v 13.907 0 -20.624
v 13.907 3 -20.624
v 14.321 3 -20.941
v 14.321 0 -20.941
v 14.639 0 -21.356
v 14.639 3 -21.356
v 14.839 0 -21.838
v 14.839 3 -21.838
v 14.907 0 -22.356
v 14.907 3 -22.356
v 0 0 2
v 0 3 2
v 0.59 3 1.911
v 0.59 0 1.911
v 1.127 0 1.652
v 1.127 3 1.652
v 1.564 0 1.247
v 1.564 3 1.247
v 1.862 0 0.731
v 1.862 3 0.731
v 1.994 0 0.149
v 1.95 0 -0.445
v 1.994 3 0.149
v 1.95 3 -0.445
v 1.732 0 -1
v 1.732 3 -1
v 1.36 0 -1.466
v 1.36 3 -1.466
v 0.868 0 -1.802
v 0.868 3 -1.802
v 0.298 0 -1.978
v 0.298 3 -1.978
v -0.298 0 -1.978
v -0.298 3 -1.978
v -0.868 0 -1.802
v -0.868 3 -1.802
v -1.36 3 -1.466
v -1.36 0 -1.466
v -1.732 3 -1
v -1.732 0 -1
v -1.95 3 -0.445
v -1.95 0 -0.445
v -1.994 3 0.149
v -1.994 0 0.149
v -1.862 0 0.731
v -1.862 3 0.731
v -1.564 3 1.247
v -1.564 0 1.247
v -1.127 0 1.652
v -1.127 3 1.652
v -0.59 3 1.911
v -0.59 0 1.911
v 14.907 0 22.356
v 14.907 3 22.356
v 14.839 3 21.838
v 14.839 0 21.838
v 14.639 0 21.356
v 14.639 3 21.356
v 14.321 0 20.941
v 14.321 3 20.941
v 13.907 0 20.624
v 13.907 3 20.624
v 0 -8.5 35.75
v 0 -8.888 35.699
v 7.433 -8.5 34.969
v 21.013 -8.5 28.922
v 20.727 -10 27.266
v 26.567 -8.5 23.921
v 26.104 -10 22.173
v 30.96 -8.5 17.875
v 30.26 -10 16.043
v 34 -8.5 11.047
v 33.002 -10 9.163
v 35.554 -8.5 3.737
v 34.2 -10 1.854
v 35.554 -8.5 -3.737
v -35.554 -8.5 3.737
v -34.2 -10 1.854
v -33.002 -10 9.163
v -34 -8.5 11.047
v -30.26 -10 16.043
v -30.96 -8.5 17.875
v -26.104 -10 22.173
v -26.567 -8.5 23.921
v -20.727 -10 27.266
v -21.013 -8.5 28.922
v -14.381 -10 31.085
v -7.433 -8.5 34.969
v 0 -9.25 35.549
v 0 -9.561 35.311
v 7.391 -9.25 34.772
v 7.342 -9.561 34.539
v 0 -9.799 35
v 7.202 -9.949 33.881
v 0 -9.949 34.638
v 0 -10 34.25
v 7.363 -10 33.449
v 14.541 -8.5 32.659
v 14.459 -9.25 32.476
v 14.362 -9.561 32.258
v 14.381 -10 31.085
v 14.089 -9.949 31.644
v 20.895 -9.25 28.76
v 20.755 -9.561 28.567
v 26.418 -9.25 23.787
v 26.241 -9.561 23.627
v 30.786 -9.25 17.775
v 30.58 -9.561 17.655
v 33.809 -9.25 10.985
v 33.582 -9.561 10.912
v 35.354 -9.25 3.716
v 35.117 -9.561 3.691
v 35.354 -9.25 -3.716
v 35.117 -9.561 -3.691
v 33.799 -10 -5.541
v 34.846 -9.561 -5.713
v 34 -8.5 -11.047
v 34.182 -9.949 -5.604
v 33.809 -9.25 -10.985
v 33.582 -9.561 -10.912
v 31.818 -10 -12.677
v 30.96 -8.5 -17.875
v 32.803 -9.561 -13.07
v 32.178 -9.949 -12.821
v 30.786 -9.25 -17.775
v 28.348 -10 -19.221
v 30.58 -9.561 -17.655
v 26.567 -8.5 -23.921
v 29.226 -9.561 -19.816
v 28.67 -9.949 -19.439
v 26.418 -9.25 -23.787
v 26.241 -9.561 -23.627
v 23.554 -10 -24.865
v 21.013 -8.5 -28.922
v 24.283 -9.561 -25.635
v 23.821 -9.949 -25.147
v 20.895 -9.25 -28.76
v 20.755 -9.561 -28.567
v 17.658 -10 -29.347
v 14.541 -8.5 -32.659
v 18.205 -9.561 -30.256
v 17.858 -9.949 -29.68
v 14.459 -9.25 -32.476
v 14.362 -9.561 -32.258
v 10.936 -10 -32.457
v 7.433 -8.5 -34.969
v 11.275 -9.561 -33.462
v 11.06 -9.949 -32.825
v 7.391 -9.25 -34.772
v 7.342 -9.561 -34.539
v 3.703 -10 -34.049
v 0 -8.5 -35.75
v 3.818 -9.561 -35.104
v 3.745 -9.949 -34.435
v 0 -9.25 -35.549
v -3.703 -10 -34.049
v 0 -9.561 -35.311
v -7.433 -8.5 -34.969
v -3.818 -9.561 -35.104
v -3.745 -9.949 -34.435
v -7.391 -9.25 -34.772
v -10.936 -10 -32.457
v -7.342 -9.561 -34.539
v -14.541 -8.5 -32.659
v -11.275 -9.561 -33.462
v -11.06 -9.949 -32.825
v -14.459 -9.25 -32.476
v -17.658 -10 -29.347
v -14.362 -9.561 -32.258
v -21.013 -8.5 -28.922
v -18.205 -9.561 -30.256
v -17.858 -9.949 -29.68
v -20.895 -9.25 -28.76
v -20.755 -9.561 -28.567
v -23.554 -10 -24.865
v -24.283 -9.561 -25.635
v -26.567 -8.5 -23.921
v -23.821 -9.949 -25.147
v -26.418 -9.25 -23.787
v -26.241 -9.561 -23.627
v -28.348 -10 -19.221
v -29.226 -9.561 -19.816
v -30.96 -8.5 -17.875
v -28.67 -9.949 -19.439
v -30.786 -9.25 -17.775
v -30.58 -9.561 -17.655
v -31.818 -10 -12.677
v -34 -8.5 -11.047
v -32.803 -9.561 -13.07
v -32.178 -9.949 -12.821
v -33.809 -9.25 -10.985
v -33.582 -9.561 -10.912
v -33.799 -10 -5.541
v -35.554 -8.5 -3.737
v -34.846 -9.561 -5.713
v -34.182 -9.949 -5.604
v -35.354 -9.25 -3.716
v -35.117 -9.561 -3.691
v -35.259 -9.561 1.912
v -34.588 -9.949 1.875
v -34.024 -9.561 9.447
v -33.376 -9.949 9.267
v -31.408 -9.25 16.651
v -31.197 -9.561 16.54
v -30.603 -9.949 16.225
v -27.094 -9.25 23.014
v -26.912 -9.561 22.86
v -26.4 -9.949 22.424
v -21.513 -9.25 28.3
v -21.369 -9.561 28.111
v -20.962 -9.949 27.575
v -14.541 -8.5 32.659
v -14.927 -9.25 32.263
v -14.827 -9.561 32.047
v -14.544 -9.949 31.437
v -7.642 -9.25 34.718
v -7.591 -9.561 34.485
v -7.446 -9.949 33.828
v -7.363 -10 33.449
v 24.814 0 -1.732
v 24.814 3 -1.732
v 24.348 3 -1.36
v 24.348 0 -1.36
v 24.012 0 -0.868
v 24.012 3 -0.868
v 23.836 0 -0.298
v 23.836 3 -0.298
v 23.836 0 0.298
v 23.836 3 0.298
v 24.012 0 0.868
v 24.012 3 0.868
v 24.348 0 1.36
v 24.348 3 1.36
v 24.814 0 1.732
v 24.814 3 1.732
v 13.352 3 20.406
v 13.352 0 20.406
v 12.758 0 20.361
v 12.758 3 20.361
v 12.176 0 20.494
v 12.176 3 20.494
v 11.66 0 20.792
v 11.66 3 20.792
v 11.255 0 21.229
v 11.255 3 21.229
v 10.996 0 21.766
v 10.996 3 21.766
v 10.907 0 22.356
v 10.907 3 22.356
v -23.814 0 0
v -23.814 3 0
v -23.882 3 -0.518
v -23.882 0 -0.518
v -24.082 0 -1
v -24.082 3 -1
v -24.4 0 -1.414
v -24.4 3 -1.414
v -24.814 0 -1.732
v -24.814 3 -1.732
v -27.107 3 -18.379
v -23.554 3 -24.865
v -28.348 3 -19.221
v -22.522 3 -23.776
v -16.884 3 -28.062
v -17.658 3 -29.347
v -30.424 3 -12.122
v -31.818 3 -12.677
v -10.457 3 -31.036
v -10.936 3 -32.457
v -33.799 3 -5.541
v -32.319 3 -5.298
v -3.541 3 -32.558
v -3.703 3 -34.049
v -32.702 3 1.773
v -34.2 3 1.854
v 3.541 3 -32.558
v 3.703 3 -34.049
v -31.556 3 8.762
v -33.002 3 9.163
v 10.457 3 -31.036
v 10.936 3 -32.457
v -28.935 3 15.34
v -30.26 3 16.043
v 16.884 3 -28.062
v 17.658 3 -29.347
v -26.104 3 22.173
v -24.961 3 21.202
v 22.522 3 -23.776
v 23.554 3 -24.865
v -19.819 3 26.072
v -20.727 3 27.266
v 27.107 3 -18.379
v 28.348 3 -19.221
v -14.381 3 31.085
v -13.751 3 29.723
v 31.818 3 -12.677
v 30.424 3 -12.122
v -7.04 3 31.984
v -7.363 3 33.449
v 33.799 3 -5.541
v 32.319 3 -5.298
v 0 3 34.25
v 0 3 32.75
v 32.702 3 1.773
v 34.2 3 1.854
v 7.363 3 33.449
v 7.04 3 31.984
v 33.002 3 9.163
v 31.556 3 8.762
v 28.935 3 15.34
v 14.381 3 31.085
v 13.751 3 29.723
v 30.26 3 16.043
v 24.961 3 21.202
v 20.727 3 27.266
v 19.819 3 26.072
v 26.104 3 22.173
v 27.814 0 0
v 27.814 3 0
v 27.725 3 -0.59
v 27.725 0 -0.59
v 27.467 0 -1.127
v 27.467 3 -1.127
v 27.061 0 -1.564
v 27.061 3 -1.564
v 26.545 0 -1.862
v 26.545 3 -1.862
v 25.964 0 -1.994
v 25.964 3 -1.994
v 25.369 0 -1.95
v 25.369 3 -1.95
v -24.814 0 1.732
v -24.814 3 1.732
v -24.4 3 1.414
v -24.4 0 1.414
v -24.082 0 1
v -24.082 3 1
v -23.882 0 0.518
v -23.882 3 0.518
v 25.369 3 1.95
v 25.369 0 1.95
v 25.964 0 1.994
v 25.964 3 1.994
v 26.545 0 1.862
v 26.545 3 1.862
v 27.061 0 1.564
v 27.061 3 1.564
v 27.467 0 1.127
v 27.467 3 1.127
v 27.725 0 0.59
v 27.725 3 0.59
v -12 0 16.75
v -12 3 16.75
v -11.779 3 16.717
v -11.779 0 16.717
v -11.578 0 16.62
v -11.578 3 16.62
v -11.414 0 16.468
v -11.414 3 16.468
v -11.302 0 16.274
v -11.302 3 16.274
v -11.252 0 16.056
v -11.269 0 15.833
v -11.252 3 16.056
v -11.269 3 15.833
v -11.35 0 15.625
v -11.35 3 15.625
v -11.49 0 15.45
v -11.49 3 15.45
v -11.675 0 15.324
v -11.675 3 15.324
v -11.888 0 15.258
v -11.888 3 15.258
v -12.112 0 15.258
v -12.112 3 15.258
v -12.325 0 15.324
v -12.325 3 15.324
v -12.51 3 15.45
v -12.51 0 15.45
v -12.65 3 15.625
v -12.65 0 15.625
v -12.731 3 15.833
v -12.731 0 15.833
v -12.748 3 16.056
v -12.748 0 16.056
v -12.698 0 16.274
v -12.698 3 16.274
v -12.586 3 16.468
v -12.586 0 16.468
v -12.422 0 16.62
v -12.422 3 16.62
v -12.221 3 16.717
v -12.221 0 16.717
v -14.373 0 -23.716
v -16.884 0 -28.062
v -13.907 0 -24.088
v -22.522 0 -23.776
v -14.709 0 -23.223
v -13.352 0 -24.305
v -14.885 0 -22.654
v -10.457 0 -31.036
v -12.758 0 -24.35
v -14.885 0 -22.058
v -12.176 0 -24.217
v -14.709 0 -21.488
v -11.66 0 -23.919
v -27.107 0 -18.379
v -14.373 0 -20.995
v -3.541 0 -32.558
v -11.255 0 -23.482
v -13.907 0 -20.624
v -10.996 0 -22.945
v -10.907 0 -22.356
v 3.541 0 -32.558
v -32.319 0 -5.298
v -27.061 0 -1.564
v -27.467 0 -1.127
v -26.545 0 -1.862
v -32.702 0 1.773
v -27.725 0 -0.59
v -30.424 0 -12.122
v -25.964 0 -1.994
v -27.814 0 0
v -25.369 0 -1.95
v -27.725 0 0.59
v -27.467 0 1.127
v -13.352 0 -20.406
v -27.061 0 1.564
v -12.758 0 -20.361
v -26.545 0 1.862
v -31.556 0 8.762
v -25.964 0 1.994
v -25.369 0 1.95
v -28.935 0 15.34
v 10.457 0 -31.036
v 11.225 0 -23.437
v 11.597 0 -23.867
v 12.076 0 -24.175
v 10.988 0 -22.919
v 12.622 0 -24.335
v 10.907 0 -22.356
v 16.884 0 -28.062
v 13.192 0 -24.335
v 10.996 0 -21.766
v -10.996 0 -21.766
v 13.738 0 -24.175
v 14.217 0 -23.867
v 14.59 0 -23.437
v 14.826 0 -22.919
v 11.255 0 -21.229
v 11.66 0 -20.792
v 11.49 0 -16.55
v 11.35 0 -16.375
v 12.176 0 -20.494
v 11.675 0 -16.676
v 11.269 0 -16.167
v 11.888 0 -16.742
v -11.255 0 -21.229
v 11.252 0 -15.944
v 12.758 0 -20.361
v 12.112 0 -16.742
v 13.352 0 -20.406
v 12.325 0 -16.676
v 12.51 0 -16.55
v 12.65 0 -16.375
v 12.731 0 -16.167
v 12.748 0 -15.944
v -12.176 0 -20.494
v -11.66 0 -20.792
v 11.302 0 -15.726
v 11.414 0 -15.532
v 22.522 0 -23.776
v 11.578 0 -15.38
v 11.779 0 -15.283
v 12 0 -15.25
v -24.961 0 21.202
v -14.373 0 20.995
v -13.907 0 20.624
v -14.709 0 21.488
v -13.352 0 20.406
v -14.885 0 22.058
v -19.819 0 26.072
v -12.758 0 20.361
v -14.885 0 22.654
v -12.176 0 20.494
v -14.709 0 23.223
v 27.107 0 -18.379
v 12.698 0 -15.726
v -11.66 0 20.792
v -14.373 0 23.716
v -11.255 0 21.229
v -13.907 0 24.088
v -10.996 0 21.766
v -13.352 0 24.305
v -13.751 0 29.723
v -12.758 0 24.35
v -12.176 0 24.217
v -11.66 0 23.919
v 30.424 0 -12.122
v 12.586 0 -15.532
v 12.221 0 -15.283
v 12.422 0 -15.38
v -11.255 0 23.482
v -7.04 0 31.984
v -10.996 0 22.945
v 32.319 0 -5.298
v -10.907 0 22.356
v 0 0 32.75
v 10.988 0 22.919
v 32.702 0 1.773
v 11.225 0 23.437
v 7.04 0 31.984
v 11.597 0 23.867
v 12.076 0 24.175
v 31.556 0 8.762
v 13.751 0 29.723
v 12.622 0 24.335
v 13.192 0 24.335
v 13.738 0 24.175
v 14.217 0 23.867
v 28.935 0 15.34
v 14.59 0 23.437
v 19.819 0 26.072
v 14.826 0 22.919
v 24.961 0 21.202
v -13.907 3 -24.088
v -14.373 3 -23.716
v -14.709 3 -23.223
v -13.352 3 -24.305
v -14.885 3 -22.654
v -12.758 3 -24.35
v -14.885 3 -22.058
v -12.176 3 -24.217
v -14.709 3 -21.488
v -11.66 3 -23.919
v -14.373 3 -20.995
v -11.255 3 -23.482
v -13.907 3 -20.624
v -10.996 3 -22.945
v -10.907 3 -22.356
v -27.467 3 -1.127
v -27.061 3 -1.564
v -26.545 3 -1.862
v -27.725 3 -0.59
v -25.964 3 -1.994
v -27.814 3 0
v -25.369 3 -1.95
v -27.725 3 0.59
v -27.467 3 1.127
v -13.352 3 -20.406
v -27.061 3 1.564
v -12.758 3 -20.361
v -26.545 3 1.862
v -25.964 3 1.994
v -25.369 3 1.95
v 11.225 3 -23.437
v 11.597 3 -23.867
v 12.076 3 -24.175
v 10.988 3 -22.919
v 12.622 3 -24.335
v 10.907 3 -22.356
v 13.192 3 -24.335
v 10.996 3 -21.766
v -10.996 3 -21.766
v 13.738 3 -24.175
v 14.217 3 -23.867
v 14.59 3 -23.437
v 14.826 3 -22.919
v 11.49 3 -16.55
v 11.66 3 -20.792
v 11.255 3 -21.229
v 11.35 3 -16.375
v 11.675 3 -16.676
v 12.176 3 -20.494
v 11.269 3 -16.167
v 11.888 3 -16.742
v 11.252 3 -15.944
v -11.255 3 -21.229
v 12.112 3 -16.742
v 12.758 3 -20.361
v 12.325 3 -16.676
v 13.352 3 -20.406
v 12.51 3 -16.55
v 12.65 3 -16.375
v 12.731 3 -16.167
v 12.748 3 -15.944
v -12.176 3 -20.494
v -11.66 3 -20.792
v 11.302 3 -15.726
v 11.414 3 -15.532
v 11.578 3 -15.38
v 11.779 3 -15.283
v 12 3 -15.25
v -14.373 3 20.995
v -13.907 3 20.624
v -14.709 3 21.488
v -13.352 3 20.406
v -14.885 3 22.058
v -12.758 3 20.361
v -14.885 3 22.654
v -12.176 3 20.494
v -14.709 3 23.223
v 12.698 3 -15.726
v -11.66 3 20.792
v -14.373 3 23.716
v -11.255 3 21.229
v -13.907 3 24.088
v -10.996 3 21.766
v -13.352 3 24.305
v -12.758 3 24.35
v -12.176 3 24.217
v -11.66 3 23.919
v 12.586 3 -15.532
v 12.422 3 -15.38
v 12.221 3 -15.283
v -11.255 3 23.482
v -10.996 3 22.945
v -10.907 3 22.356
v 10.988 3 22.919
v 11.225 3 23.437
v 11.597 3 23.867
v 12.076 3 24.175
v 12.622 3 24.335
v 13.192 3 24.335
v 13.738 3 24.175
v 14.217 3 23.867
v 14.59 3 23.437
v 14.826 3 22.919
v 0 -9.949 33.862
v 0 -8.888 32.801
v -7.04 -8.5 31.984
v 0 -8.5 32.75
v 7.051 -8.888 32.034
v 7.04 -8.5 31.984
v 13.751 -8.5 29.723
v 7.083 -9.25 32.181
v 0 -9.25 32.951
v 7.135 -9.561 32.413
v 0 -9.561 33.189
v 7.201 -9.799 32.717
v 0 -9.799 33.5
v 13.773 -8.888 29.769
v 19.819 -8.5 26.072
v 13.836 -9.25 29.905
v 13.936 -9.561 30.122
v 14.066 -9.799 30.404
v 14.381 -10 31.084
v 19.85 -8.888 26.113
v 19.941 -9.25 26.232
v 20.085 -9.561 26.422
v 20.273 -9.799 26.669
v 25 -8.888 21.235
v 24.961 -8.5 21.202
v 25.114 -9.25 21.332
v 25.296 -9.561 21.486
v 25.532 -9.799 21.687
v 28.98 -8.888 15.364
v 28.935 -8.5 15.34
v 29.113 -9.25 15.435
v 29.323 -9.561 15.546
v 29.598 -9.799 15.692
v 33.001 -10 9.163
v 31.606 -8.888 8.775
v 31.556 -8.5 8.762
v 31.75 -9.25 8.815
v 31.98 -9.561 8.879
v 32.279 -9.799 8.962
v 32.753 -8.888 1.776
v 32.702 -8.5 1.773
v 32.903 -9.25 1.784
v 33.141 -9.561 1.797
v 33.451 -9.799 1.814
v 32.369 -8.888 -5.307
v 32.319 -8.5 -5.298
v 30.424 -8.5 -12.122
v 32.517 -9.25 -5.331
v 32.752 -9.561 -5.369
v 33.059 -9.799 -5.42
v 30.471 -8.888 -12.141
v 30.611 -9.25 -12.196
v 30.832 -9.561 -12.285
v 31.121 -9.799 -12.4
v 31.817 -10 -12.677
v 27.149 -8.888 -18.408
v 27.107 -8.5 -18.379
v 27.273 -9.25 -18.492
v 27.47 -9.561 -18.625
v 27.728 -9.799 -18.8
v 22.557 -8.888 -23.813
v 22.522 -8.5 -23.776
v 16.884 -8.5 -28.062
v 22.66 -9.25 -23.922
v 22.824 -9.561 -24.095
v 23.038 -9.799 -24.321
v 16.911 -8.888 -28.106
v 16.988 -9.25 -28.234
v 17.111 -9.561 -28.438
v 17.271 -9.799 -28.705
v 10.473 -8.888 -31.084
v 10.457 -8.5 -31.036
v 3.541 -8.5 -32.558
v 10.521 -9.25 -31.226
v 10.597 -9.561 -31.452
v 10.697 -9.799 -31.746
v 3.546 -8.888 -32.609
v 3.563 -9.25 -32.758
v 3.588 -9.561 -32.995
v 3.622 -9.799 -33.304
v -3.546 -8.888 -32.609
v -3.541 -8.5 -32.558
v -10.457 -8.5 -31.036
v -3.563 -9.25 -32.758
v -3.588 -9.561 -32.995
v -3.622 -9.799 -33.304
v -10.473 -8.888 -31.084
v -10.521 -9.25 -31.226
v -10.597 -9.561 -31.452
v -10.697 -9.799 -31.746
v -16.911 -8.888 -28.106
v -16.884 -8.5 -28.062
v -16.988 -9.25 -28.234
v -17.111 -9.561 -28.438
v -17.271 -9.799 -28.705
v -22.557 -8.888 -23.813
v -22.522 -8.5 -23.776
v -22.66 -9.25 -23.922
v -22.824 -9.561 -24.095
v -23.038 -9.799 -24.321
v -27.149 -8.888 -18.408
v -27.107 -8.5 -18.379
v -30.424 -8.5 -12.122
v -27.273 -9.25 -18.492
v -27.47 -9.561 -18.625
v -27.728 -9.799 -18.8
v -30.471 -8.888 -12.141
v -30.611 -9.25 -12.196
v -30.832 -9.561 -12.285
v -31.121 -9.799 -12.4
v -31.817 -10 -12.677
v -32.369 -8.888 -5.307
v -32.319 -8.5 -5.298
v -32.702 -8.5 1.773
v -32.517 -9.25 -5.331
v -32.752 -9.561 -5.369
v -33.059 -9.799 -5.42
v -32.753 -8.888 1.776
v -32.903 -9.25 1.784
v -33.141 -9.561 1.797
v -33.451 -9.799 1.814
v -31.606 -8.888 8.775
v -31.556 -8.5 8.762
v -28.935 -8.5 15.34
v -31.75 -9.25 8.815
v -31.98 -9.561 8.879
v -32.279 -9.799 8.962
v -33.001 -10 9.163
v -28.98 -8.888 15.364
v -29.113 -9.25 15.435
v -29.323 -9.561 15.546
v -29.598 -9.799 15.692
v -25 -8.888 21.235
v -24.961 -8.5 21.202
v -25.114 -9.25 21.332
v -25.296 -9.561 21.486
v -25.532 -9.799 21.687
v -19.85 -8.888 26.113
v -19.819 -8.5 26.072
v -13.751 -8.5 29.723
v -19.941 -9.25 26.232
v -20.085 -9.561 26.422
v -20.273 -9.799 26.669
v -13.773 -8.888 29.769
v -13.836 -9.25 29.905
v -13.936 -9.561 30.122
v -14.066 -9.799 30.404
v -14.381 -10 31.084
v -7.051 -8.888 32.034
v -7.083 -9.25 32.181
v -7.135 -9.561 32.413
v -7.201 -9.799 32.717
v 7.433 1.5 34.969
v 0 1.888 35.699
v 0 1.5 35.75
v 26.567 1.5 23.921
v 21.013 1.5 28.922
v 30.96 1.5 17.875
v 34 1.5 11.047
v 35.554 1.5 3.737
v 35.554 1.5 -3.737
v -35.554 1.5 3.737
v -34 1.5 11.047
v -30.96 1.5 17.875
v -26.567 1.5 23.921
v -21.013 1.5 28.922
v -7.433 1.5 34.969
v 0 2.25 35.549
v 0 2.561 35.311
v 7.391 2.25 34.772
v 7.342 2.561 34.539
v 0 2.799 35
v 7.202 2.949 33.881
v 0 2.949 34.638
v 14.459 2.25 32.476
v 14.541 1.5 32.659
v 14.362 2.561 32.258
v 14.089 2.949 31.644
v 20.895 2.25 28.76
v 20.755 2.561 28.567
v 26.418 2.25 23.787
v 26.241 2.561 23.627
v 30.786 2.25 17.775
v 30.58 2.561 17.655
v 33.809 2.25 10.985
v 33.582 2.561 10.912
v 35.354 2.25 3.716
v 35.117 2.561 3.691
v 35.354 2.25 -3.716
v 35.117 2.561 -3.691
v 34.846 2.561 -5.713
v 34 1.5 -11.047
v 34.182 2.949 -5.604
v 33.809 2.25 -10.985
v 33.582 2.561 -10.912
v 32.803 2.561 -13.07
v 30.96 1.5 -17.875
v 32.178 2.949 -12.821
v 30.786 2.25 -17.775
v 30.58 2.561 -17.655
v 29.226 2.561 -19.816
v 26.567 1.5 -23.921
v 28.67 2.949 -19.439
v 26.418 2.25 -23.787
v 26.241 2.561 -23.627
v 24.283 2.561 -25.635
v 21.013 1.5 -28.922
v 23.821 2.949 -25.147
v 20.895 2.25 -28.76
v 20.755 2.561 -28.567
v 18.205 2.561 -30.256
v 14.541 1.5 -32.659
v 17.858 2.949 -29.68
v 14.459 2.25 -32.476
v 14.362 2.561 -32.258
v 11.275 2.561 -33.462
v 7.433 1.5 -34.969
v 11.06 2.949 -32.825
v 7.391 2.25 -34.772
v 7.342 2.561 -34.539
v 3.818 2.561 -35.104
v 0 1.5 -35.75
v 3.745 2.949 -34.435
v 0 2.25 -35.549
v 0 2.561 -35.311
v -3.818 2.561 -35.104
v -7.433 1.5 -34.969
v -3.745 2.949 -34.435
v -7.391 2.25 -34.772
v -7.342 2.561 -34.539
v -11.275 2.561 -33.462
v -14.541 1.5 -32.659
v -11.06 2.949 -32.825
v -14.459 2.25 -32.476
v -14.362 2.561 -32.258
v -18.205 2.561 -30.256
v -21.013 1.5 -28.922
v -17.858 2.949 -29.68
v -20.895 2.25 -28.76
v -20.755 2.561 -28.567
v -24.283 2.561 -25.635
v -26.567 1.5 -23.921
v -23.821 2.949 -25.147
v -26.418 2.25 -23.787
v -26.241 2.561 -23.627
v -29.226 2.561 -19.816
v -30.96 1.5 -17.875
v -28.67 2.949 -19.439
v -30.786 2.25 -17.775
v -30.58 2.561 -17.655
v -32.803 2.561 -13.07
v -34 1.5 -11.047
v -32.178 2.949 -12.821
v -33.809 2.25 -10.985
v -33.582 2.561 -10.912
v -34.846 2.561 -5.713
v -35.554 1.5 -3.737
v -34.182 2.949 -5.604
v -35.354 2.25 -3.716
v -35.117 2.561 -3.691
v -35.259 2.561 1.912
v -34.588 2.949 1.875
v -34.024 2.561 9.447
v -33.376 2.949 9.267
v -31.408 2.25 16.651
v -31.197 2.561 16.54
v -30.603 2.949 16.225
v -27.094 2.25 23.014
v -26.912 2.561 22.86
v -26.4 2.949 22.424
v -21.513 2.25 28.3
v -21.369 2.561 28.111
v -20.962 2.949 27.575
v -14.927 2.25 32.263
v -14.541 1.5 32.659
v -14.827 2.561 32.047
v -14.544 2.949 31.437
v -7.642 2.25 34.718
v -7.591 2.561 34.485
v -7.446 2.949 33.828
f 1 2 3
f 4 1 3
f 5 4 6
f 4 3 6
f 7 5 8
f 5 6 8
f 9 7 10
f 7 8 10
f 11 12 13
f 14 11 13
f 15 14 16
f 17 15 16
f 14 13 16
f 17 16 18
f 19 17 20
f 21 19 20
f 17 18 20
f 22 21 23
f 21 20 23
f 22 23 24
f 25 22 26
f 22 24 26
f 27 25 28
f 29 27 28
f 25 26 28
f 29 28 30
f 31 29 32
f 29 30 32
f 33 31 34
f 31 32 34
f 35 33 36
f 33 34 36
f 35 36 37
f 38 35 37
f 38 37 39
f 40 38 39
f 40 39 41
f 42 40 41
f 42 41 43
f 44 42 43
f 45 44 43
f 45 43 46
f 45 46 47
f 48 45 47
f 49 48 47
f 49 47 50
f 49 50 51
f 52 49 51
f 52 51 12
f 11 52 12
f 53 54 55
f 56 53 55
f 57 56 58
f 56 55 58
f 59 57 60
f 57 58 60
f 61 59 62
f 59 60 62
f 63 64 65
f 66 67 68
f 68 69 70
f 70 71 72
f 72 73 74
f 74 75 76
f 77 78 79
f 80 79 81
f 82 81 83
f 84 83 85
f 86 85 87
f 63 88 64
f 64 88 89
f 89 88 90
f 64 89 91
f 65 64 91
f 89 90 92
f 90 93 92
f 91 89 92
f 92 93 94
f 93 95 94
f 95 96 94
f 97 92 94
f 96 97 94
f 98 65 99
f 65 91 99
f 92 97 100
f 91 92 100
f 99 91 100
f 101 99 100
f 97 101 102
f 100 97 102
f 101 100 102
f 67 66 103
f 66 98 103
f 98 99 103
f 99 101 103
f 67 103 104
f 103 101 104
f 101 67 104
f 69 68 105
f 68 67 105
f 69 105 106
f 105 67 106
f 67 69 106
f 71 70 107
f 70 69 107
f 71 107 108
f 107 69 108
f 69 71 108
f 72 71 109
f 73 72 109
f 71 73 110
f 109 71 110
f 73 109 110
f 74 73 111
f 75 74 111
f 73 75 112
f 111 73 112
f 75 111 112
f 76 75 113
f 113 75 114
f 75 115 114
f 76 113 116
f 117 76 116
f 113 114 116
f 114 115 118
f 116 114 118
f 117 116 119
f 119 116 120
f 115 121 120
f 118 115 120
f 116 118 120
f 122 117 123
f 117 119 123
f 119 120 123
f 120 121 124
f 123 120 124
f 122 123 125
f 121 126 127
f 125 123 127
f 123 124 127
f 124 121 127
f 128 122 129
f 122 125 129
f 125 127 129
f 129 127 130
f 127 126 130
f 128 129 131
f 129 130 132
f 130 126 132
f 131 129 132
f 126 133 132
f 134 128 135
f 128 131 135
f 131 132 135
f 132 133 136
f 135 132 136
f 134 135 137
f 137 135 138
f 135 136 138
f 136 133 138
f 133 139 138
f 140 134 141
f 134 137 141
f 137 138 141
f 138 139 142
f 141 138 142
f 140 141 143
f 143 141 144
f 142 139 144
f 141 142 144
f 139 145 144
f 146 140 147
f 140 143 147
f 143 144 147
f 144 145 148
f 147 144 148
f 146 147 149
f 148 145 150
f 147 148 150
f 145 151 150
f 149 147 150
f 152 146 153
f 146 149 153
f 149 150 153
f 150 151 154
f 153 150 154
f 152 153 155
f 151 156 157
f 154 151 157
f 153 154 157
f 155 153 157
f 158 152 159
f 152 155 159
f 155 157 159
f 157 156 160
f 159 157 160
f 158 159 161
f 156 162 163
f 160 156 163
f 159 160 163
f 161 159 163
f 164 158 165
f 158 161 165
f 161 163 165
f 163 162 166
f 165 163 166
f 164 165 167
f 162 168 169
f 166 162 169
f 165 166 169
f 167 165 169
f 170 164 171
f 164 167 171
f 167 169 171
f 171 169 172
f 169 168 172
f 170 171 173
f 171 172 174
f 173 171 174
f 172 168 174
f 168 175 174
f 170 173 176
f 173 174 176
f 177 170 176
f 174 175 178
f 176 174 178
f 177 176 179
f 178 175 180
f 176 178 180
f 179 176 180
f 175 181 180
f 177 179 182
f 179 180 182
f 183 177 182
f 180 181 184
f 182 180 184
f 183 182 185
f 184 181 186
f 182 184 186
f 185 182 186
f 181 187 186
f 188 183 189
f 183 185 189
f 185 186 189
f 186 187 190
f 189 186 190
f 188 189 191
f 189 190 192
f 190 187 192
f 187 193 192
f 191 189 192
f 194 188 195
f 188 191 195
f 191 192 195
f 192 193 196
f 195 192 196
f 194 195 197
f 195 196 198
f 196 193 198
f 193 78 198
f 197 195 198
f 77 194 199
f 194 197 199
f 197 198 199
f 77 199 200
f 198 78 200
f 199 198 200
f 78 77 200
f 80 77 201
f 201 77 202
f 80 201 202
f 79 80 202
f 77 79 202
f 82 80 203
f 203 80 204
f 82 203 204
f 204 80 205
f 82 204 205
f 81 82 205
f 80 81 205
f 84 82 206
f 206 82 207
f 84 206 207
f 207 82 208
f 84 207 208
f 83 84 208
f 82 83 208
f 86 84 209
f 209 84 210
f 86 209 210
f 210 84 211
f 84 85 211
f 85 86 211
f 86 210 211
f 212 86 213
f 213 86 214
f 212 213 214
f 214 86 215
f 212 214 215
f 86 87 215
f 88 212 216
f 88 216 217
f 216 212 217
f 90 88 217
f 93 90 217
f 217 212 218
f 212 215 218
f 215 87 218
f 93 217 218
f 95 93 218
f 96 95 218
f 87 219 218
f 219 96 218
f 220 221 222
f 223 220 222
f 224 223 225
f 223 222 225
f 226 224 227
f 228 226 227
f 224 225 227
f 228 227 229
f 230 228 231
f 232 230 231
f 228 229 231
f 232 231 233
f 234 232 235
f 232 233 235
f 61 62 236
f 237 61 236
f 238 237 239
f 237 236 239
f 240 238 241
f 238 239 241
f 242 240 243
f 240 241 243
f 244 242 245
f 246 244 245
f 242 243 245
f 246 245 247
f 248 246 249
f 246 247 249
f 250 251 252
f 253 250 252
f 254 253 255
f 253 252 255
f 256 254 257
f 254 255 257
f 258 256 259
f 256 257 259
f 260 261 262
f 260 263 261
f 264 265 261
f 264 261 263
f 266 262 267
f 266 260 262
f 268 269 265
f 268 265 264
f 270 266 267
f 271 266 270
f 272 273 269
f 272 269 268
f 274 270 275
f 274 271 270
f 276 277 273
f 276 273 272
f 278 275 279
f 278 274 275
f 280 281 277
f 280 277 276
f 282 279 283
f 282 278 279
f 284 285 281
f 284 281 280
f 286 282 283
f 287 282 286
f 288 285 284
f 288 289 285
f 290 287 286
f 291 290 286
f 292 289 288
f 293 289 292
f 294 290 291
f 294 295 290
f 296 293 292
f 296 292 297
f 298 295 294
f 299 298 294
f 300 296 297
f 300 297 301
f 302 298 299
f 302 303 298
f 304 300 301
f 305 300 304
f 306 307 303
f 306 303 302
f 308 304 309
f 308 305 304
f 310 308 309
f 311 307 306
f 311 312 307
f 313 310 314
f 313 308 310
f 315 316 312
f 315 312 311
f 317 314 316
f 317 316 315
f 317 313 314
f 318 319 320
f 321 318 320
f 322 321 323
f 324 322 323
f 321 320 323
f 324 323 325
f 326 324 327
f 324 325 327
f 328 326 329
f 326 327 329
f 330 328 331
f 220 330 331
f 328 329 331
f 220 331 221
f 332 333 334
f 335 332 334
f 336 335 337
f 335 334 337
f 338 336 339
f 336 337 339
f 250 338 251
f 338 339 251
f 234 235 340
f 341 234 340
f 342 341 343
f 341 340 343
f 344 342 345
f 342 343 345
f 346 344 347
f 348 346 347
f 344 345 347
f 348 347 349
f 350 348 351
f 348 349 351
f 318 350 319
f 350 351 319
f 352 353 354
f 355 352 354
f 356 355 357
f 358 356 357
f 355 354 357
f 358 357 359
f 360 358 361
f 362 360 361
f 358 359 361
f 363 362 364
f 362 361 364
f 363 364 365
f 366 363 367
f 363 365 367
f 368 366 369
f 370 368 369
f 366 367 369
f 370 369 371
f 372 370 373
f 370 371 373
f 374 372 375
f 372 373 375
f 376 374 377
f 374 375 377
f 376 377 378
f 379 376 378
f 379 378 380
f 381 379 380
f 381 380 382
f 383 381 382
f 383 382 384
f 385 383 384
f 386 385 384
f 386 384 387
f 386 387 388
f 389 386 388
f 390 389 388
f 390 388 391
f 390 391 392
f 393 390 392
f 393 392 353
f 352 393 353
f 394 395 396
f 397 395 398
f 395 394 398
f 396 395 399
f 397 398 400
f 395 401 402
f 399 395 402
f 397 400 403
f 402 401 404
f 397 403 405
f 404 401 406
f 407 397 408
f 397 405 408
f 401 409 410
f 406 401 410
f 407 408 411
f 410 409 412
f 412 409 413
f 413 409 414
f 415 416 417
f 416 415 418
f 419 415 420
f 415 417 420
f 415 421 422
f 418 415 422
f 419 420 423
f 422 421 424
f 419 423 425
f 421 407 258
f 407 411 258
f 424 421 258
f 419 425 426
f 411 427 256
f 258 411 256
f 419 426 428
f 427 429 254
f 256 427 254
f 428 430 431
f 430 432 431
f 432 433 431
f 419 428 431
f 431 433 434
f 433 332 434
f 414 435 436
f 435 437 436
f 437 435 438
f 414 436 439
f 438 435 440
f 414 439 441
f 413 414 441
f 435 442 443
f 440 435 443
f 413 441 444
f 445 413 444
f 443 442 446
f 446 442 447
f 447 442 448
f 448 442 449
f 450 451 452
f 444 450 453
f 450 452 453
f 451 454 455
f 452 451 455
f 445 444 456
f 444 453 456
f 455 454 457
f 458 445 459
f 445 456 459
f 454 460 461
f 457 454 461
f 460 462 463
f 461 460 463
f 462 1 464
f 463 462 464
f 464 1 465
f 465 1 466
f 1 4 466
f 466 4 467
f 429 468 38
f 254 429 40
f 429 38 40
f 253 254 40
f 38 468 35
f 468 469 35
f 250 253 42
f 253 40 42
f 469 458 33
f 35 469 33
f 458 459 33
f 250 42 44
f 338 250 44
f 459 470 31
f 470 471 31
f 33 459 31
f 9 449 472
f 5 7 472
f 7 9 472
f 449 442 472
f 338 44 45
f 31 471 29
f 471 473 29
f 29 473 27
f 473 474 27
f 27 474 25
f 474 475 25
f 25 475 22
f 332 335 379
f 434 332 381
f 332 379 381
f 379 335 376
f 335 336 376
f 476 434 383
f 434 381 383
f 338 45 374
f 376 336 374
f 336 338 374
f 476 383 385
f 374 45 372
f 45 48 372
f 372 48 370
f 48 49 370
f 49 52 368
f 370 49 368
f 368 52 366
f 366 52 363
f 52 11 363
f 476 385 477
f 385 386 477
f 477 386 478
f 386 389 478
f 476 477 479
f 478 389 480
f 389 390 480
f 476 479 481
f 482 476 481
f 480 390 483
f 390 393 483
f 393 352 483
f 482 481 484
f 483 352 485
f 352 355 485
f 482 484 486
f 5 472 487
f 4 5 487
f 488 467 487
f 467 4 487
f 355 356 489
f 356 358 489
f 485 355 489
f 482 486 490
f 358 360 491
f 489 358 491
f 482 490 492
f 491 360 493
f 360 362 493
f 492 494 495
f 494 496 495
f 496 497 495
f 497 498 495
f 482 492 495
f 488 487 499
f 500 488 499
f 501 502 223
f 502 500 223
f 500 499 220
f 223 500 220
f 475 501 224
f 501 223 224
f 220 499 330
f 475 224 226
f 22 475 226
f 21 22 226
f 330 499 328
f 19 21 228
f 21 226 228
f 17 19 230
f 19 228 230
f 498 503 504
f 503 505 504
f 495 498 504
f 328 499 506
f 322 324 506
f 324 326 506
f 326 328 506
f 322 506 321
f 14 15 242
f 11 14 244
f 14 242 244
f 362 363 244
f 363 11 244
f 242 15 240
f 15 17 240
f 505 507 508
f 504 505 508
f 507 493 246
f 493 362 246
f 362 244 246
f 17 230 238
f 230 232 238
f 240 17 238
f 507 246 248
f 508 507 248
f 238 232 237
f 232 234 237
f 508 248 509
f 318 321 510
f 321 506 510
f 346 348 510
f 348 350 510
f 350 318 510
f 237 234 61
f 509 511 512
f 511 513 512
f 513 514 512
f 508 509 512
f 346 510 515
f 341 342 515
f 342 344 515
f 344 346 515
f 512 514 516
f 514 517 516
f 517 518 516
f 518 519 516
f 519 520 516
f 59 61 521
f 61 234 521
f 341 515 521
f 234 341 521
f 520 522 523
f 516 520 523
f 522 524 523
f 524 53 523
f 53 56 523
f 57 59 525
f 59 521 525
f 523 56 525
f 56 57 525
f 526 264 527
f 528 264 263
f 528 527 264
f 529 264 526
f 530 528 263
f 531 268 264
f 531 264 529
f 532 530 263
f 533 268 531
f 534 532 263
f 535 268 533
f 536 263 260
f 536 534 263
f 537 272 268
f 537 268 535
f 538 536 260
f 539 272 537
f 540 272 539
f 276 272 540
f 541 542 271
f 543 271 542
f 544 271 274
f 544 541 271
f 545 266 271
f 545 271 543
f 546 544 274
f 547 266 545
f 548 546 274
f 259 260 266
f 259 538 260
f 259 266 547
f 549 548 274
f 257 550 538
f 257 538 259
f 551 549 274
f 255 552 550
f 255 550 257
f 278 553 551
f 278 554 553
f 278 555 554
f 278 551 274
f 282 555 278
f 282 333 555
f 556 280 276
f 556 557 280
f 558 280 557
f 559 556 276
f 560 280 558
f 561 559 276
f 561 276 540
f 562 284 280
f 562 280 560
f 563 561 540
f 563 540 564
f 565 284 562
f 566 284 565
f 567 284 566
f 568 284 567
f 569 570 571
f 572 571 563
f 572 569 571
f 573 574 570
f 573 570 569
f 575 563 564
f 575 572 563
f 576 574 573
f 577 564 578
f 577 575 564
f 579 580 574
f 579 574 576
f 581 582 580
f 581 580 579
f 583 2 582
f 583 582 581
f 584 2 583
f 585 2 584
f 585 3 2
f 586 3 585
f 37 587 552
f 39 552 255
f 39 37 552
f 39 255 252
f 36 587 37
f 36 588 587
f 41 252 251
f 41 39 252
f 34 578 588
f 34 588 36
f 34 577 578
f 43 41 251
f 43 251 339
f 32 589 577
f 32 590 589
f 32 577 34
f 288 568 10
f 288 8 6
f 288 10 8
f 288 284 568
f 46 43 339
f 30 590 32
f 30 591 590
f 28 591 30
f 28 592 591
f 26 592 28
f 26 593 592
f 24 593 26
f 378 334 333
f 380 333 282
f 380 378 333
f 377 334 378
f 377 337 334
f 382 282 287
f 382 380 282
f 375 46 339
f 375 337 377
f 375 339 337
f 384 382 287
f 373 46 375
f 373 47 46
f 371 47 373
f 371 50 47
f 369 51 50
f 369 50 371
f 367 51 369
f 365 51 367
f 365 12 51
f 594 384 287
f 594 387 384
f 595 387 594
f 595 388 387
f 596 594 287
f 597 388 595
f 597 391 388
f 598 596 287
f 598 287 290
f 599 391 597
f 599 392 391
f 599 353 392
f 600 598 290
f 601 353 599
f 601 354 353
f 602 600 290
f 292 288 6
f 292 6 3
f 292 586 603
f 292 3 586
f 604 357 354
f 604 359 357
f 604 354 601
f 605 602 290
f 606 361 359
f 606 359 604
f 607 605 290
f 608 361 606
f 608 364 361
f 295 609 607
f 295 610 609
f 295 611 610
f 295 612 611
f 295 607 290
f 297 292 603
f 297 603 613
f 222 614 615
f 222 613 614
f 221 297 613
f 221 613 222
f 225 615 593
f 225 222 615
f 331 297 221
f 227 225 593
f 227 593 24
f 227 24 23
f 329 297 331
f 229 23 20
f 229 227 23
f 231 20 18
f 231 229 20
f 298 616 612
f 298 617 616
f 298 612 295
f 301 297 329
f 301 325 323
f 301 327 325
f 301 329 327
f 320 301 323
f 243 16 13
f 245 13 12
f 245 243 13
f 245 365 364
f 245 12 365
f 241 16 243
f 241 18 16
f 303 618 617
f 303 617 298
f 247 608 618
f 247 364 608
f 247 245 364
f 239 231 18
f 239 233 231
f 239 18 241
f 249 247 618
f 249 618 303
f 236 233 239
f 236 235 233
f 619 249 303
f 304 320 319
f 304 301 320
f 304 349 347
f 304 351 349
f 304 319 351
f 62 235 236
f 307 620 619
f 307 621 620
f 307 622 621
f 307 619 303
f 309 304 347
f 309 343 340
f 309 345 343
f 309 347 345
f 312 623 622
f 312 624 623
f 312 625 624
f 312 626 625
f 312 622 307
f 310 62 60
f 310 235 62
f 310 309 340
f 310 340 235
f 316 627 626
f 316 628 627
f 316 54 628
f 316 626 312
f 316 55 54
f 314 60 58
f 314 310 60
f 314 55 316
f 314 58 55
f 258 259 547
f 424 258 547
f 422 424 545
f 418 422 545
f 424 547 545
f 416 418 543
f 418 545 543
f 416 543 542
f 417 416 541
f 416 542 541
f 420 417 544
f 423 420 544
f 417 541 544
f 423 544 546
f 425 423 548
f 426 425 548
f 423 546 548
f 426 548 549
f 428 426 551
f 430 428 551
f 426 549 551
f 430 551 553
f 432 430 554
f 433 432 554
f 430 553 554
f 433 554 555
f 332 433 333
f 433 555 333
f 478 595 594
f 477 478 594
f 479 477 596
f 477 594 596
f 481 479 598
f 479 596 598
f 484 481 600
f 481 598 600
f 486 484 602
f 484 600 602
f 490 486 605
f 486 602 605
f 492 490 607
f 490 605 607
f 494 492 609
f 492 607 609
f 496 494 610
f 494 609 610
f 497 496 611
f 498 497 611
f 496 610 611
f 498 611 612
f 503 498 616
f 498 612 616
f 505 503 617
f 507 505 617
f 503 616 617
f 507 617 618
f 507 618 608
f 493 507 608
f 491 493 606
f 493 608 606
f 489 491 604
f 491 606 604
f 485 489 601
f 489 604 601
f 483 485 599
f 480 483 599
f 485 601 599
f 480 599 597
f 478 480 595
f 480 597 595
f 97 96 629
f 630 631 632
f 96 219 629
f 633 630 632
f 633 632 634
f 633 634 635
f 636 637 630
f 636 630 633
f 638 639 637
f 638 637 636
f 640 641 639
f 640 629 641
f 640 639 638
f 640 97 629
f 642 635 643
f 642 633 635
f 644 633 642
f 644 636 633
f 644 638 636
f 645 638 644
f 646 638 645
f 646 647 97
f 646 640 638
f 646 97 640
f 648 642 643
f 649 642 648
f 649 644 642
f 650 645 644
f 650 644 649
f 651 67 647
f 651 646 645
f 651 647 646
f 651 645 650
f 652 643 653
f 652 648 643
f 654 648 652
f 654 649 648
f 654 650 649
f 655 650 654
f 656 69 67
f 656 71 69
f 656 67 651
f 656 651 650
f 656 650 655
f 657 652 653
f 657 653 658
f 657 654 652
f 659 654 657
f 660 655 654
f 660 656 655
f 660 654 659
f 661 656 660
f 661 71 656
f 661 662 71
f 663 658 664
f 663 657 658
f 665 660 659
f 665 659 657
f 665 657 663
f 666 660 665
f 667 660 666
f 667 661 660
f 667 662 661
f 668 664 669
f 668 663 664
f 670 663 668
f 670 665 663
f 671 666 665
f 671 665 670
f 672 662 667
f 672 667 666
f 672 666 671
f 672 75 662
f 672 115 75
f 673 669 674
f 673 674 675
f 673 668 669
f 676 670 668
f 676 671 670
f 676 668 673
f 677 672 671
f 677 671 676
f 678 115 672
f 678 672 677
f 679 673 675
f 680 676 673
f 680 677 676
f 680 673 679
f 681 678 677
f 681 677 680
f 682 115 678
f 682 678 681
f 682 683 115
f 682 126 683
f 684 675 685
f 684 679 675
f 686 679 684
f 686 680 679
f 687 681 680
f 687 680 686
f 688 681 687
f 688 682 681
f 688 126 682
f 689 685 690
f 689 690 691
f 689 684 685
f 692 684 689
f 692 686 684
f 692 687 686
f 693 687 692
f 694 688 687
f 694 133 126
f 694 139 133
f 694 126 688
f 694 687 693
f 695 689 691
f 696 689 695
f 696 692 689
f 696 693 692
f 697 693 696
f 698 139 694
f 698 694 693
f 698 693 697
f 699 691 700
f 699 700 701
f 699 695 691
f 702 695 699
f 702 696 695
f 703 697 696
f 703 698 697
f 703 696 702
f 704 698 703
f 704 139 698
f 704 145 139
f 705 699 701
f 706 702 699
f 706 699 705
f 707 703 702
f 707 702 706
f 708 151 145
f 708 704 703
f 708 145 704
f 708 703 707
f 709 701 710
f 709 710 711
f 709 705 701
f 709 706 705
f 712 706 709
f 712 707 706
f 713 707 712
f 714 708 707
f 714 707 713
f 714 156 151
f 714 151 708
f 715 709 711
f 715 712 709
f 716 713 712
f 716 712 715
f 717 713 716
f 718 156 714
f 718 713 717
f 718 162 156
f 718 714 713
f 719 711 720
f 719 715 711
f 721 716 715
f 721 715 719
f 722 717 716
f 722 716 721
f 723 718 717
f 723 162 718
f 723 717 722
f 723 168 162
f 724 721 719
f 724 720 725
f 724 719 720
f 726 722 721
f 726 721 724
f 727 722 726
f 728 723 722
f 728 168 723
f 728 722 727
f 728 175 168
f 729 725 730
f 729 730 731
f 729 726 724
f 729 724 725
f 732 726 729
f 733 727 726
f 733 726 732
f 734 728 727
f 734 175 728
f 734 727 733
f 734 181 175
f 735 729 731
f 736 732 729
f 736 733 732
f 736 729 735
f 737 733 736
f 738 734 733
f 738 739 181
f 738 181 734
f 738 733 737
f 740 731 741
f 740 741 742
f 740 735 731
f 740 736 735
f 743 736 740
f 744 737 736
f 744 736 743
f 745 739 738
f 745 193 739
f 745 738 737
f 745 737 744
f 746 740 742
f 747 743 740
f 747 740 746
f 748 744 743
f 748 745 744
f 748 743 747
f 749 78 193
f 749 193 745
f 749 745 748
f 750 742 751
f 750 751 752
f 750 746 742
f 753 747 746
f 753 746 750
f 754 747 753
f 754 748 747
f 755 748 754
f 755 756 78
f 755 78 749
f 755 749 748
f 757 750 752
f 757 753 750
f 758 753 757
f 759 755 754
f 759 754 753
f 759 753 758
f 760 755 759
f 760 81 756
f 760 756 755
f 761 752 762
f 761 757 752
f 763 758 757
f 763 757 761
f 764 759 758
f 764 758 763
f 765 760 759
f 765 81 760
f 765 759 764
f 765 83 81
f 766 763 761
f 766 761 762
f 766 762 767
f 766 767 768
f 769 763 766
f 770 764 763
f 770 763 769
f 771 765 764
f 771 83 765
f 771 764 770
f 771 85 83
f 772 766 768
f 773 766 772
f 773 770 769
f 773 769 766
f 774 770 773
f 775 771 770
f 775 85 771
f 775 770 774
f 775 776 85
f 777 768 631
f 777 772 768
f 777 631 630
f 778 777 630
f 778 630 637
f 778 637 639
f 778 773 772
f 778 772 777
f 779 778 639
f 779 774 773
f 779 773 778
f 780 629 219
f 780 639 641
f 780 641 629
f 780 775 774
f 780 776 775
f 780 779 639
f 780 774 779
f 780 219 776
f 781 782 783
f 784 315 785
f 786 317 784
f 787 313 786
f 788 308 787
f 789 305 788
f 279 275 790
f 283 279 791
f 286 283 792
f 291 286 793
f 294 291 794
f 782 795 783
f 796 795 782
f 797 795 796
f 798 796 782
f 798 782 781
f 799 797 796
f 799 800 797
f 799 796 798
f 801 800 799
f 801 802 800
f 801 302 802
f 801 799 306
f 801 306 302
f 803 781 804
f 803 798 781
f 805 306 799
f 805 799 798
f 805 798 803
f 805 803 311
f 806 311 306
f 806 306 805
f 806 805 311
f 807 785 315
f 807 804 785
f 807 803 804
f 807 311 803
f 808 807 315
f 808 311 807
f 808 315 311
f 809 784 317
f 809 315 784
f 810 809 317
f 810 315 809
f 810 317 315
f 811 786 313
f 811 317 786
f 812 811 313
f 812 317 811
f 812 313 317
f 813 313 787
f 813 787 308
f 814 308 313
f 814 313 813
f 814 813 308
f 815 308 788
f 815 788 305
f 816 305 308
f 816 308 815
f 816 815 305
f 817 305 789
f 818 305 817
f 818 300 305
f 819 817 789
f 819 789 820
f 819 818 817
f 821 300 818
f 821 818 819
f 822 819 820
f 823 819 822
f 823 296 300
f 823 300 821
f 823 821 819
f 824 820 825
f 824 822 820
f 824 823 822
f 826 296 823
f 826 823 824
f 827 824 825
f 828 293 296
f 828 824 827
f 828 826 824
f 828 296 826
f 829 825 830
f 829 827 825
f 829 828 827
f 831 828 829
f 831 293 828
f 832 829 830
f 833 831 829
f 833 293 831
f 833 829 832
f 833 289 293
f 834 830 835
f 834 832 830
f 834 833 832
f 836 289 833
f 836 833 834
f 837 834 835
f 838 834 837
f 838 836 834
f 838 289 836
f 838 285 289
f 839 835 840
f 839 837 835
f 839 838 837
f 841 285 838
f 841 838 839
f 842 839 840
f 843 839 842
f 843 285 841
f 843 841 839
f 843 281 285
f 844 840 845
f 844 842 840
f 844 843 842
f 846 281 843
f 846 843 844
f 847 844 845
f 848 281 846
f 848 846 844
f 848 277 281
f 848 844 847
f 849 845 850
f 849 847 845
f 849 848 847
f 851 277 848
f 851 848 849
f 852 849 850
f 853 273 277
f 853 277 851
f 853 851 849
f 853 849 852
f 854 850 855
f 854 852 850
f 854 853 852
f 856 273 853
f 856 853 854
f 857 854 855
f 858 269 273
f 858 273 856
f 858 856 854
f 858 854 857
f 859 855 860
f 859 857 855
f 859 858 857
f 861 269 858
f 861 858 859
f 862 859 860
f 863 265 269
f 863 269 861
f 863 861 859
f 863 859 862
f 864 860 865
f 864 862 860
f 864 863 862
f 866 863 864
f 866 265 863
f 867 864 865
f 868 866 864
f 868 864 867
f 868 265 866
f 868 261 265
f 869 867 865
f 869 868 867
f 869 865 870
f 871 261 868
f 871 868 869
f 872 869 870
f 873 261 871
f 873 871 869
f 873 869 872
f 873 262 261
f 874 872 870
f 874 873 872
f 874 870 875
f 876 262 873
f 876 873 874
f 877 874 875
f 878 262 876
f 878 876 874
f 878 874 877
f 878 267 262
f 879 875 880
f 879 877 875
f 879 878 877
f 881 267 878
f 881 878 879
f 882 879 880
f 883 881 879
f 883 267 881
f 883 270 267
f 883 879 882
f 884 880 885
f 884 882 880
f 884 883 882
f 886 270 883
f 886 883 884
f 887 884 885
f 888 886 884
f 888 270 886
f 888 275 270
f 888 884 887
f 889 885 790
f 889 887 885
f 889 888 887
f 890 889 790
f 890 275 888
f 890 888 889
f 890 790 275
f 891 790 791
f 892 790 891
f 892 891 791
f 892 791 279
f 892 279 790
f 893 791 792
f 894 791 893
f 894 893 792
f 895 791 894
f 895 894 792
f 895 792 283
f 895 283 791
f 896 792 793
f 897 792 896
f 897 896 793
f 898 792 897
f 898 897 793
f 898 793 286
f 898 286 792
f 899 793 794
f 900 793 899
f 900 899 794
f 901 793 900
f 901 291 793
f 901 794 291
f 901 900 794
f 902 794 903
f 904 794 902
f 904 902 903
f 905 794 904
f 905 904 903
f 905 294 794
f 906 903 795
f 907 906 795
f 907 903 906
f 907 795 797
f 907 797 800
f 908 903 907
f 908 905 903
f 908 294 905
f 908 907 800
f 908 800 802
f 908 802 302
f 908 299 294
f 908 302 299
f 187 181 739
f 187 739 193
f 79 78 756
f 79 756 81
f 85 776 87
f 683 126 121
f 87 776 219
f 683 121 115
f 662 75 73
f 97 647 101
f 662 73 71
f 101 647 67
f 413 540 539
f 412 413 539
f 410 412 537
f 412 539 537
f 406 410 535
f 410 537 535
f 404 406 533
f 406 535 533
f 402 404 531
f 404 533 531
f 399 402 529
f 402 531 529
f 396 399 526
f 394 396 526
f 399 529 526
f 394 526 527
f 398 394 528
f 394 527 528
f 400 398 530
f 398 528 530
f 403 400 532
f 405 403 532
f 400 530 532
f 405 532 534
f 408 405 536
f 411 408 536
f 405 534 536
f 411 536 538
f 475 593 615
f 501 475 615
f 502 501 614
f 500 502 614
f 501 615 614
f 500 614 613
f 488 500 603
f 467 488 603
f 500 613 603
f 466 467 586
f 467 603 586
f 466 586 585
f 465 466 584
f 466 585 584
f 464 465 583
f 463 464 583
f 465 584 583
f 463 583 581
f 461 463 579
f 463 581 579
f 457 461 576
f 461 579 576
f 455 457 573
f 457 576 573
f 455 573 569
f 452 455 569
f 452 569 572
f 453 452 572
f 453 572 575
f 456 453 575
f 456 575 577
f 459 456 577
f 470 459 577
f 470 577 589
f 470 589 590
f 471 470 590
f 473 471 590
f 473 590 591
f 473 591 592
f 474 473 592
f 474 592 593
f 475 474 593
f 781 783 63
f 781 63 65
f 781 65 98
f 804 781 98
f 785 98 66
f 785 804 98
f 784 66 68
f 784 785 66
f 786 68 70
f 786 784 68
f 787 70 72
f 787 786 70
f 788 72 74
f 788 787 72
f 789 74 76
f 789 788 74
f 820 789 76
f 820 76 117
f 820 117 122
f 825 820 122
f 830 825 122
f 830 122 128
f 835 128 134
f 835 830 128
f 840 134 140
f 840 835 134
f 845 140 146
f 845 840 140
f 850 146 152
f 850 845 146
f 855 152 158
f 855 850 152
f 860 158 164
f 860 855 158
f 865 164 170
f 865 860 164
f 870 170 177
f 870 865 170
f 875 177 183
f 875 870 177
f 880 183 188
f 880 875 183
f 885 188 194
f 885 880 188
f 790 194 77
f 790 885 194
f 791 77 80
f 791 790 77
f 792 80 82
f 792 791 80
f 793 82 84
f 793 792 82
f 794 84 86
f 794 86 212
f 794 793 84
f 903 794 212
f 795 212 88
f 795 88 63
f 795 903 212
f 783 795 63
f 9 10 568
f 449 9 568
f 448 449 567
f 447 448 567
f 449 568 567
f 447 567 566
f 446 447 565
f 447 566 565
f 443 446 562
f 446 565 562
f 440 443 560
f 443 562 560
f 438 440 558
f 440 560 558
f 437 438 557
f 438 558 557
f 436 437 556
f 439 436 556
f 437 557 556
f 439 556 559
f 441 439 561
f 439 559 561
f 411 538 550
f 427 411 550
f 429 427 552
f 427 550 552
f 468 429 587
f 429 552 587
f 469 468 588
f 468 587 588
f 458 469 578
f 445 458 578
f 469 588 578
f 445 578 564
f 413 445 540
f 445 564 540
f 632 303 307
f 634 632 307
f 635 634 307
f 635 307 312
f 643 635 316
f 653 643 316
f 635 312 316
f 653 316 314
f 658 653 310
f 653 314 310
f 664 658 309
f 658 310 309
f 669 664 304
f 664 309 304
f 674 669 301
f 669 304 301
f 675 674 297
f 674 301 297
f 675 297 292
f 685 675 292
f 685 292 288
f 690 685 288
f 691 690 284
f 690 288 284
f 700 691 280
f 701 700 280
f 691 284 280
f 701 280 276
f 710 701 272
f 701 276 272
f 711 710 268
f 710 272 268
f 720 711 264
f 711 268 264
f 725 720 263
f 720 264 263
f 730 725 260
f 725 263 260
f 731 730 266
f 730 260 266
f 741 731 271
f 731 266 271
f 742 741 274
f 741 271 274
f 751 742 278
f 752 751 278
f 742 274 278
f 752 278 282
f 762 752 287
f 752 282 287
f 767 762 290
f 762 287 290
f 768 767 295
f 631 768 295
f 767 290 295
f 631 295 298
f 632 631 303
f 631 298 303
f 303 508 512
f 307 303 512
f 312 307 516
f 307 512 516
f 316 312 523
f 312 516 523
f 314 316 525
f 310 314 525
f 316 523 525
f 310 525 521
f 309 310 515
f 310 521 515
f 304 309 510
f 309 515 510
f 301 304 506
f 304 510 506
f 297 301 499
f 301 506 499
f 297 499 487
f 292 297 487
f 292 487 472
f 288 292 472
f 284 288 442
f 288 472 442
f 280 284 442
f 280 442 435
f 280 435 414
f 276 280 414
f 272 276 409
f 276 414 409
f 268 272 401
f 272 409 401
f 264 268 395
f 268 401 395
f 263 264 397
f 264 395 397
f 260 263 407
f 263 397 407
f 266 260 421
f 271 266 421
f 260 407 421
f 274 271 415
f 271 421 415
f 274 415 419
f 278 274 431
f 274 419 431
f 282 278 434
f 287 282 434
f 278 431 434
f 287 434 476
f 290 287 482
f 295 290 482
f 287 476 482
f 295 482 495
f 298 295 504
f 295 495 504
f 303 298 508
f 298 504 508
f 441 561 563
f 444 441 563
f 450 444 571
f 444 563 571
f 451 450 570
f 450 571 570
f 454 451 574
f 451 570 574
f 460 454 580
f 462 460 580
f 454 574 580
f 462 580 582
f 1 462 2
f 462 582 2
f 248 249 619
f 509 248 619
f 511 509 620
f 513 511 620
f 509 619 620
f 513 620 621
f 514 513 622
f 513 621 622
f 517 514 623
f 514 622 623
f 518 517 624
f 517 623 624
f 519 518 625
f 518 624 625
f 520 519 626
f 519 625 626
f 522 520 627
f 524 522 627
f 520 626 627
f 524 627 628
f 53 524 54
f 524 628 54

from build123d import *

# Parameters (mm, degrees)
CROQUIS1_R              = 32.75
SALIENTE_EXTRUIR1_DEPTH = 3
CROQUIS2_R              = 2
CORTAR_EXTRUIR1_DEPTH   = 4
CORTAR_EXTRUIR4_DEPTH   = 10
CROQUIS8_R              = 35.75
CROQUIS8_R_2            = 32.75
SALIENTE_EXTRUIR2_DEPTH = 13
REDONDEO1_R             = 1.5
CROQUIS9_R              = 0.75
CORTAR_EXTRUIR5_DEPTH   = 10


with BuildPart() as part:
    # Croquis1 → Saliente-Extruir1 (new body)
    with BuildSketch(Plane(origin=(0, 0, 0), x_dir=(1, 0, 0), z_dir=(0, 1, 0))):
        with Locations(Location((0, 0, 0), (0, 0, 270))):
            Circle(CROQUIS1_R)
    extrude(amount=SALIENTE_EXTRUIR1_DEPTH)

    # Croquis2 → Cortar-Extruir1 (cut)
    with BuildSketch(Plane(origin=(0, 3, 0), x_dir=(1, 0, 0), z_dir=(0, 1, 0))):
        with Locations(Location((0, 0, 0), (0, 0, 270))):
            Circle(CROQUIS2_R)
    extrude(amount=-CORTAR_EXTRUIR1_DEPTH, mode=Mode.SUBTRACT)

    # Croquis7 → Cortar-Extruir4 (cut)
    with BuildSketch(Plane(origin=(0, 3, 0), x_dir=(1, 0, 0), z_dir=(0, 1, 0))):
        with BuildLine():
            ThreePointArc((-13.907029535, 20.623580122), (-11.907029535, 20.623580122), (-10.907029535, 22.355630929))
            Line((-10.907029535, 22.355630929), (-12.907029535, 22.355630929))
            Line((-12.907029535, 22.355630929), (-13.907029535, 20.623580122))
        make_face()
        with BuildLine():
            Line((-12.907029535, 22.355630929), (-10.907029535, 22.355630929))
            ThreePointArc((-10.907029535, 22.355630929), (-13.907029535, 24.087681737), (-13.907029535, 20.623580122))
            Line((-13.907029535, 20.623580122), (-12.907029535, 22.355630929))
        make_face()
        with BuildLine():
            ThreePointArc((-23.81405907, 0), (-24.082008262, 1), (-24.81405907, 1.732050808))
            Line((-24.81405907, 1.732050808), (-25.81405907, 0))
            Line((-25.81405907, 0), (-24.81405907, -1.732050808))
            ThreePointArc((-24.81405907, -1.732050808), (-24.082008262, -1), (-23.81405907, 0))
        make_face()
        with BuildLine():
            Line((-25.81405907, 0), (-24.81405907, 1.732050808))
            ThreePointArc((-24.81405907, 1.732050808), (-27.81405907, 0), (-24.81405907, -1.732050808))
            Line((-24.81405907, -1.732050808), (-25.81405907, 0))
        make_face()
        with BuildLine():
            ThreePointArc((10.907029535, 22.355630929), (11.907029535, 20.623580122), (13.907029535, 20.623580122))
            Line((13.907029535, 20.623580122), (12.907029535, 22.355630929))
            Line((12.907029535, 22.355630929), (10.907029535, 22.355630929))
        make_face()
        with BuildLine():
            Line((12.907029535, 22.355630929), (13.907029535, 20.623580122))
            ThreePointArc((13.907029535, 20.623580122), (14.639080343, 21.355630929), (14.907029535, 22.355630929))
            ThreePointArc((14.907029535, 22.355630929), (12.907029535, 24.355630929), (10.907029535, 22.355630929))
            Line((10.907029535, 22.355630929), (12.907029535, 22.355630929))
        make_face()
        with BuildLine():
            Line((24.81405907, -1.732050808), (25.81405907, 0))
            Line((25.81405907, 0), (24.81405907, 1.732050808))
            ThreePointArc((24.81405907, 1.732050808), (23.81405907, 0), (24.81405907, -1.732050808))
        make_face()
        with BuildLine():
            Line((24.81405907, 1.732050808), (25.81405907, 0))
            Line((25.81405907, 0), (24.81405907, -1.732050808))
            ThreePointArc((24.81405907, -1.732050808), (26.81405907, -1.732050808), (27.81405907, 0))
            ThreePointArc((27.81405907, 0), (26.81405907, 1.732050808), (24.81405907, 1.732050808))
        make_face()
        with BuildLine():
            ThreePointArc((-13.907029535, -20.623580122), (-13.907029535, -24.087681737), (-10.907029535, -22.355630929))
            Line((-10.907029535, -22.355630929), (-12.907029535, -22.355630929))
            Line((-12.907029535, -22.355630929), (-13.907029535, -20.623580122))
        make_face()
        with BuildLine():
            Line((-12.907029535, -22.355630929), (-10.907029535, -22.355630929))
            ThreePointArc((-10.907029535, -22.355630929), (-11.907029535, -20.623580122), (-13.907029535, -20.623580122))
            Line((-13.907029535, -20.623580122), (-12.907029535, -22.355630929))
        make_face()
        with BuildLine():
            ThreePointArc((14.907029535, -22.355630929), (14.639080343, -21.355630929), (13.907029535, -20.623580122))
            Line((13.907029535, -20.623580122), (12.907029535, -22.355630929))
            Line((12.907029535, -22.355630929), (10.907029535, -22.355630929))
            ThreePointArc((10.907029535, -22.355630929), (12.907029535, -24.355630929), (14.907029535, -22.355630929))
        make_face()
        with BuildLine():
            Line((12.907029535, -22.355630929), (13.907029535, -20.623580122))
            ThreePointArc((13.907029535, -20.623580122), (11.907029535, -20.623580122), (10.907029535, -22.355630929))
            Line((10.907029535, -22.355630929), (12.907029535, -22.355630929))
        make_face()
    extrude(amount=-CORTAR_EXTRUIR4_DEPTH, mode=Mode.SUBTRACT)

    # Croquis9 → Cortar-Extruir5 (cut)
    with BuildSketch(Plane(origin=(0, 3, 0), x_dir=(1, 0, 0), z_dir=(0, 1, 0))):
        with Locations(Location((12, 16, 0), (0, 0, 270))):
            Circle(CROQUIS9_R)
        with Locations(Location((-12, -16, 0), (0, 0, 270))):
            Circle(CROQUIS9_R)
    extrude(amount=-CORTAR_EXTRUIR5_DEPTH, mode=Mode.SUBTRACT)


with BuildPart() as body_2:
    # Croquis8 → Saliente-Extruir2 (new body)
    with BuildSketch(Plane(origin=(0, 3, 0), x_dir=(1, 0, 0), z_dir=(0, 1, 0))):
        with Locations(Location((0, 0, 0), (0, 0, 270))):
            Circle(CROQUIS8_R)
        with Locations(Location((0, 0, 0), (0, 0, 270))):
            Circle(CROQUIS8_R_2, mode=Mode.SUBTRACT)
    extrude(amount=-SALIENTE_EXTRUIR2_DEPTH)

    # Redondeo1
    redondeo1_edges = [body_2.edges().sort_by_distance(p)[0] for p in [
        (0, 3, -35.75),
        (0, -10, -35.75),
        (0, -10, -32.75),
    ]]
    fillet(redondeo1_edges, radius=REDONDEO1_R - 0.0001)  # a hair under: the kernel refuses the full size


solid = Compound([part.part, body_2.part])
